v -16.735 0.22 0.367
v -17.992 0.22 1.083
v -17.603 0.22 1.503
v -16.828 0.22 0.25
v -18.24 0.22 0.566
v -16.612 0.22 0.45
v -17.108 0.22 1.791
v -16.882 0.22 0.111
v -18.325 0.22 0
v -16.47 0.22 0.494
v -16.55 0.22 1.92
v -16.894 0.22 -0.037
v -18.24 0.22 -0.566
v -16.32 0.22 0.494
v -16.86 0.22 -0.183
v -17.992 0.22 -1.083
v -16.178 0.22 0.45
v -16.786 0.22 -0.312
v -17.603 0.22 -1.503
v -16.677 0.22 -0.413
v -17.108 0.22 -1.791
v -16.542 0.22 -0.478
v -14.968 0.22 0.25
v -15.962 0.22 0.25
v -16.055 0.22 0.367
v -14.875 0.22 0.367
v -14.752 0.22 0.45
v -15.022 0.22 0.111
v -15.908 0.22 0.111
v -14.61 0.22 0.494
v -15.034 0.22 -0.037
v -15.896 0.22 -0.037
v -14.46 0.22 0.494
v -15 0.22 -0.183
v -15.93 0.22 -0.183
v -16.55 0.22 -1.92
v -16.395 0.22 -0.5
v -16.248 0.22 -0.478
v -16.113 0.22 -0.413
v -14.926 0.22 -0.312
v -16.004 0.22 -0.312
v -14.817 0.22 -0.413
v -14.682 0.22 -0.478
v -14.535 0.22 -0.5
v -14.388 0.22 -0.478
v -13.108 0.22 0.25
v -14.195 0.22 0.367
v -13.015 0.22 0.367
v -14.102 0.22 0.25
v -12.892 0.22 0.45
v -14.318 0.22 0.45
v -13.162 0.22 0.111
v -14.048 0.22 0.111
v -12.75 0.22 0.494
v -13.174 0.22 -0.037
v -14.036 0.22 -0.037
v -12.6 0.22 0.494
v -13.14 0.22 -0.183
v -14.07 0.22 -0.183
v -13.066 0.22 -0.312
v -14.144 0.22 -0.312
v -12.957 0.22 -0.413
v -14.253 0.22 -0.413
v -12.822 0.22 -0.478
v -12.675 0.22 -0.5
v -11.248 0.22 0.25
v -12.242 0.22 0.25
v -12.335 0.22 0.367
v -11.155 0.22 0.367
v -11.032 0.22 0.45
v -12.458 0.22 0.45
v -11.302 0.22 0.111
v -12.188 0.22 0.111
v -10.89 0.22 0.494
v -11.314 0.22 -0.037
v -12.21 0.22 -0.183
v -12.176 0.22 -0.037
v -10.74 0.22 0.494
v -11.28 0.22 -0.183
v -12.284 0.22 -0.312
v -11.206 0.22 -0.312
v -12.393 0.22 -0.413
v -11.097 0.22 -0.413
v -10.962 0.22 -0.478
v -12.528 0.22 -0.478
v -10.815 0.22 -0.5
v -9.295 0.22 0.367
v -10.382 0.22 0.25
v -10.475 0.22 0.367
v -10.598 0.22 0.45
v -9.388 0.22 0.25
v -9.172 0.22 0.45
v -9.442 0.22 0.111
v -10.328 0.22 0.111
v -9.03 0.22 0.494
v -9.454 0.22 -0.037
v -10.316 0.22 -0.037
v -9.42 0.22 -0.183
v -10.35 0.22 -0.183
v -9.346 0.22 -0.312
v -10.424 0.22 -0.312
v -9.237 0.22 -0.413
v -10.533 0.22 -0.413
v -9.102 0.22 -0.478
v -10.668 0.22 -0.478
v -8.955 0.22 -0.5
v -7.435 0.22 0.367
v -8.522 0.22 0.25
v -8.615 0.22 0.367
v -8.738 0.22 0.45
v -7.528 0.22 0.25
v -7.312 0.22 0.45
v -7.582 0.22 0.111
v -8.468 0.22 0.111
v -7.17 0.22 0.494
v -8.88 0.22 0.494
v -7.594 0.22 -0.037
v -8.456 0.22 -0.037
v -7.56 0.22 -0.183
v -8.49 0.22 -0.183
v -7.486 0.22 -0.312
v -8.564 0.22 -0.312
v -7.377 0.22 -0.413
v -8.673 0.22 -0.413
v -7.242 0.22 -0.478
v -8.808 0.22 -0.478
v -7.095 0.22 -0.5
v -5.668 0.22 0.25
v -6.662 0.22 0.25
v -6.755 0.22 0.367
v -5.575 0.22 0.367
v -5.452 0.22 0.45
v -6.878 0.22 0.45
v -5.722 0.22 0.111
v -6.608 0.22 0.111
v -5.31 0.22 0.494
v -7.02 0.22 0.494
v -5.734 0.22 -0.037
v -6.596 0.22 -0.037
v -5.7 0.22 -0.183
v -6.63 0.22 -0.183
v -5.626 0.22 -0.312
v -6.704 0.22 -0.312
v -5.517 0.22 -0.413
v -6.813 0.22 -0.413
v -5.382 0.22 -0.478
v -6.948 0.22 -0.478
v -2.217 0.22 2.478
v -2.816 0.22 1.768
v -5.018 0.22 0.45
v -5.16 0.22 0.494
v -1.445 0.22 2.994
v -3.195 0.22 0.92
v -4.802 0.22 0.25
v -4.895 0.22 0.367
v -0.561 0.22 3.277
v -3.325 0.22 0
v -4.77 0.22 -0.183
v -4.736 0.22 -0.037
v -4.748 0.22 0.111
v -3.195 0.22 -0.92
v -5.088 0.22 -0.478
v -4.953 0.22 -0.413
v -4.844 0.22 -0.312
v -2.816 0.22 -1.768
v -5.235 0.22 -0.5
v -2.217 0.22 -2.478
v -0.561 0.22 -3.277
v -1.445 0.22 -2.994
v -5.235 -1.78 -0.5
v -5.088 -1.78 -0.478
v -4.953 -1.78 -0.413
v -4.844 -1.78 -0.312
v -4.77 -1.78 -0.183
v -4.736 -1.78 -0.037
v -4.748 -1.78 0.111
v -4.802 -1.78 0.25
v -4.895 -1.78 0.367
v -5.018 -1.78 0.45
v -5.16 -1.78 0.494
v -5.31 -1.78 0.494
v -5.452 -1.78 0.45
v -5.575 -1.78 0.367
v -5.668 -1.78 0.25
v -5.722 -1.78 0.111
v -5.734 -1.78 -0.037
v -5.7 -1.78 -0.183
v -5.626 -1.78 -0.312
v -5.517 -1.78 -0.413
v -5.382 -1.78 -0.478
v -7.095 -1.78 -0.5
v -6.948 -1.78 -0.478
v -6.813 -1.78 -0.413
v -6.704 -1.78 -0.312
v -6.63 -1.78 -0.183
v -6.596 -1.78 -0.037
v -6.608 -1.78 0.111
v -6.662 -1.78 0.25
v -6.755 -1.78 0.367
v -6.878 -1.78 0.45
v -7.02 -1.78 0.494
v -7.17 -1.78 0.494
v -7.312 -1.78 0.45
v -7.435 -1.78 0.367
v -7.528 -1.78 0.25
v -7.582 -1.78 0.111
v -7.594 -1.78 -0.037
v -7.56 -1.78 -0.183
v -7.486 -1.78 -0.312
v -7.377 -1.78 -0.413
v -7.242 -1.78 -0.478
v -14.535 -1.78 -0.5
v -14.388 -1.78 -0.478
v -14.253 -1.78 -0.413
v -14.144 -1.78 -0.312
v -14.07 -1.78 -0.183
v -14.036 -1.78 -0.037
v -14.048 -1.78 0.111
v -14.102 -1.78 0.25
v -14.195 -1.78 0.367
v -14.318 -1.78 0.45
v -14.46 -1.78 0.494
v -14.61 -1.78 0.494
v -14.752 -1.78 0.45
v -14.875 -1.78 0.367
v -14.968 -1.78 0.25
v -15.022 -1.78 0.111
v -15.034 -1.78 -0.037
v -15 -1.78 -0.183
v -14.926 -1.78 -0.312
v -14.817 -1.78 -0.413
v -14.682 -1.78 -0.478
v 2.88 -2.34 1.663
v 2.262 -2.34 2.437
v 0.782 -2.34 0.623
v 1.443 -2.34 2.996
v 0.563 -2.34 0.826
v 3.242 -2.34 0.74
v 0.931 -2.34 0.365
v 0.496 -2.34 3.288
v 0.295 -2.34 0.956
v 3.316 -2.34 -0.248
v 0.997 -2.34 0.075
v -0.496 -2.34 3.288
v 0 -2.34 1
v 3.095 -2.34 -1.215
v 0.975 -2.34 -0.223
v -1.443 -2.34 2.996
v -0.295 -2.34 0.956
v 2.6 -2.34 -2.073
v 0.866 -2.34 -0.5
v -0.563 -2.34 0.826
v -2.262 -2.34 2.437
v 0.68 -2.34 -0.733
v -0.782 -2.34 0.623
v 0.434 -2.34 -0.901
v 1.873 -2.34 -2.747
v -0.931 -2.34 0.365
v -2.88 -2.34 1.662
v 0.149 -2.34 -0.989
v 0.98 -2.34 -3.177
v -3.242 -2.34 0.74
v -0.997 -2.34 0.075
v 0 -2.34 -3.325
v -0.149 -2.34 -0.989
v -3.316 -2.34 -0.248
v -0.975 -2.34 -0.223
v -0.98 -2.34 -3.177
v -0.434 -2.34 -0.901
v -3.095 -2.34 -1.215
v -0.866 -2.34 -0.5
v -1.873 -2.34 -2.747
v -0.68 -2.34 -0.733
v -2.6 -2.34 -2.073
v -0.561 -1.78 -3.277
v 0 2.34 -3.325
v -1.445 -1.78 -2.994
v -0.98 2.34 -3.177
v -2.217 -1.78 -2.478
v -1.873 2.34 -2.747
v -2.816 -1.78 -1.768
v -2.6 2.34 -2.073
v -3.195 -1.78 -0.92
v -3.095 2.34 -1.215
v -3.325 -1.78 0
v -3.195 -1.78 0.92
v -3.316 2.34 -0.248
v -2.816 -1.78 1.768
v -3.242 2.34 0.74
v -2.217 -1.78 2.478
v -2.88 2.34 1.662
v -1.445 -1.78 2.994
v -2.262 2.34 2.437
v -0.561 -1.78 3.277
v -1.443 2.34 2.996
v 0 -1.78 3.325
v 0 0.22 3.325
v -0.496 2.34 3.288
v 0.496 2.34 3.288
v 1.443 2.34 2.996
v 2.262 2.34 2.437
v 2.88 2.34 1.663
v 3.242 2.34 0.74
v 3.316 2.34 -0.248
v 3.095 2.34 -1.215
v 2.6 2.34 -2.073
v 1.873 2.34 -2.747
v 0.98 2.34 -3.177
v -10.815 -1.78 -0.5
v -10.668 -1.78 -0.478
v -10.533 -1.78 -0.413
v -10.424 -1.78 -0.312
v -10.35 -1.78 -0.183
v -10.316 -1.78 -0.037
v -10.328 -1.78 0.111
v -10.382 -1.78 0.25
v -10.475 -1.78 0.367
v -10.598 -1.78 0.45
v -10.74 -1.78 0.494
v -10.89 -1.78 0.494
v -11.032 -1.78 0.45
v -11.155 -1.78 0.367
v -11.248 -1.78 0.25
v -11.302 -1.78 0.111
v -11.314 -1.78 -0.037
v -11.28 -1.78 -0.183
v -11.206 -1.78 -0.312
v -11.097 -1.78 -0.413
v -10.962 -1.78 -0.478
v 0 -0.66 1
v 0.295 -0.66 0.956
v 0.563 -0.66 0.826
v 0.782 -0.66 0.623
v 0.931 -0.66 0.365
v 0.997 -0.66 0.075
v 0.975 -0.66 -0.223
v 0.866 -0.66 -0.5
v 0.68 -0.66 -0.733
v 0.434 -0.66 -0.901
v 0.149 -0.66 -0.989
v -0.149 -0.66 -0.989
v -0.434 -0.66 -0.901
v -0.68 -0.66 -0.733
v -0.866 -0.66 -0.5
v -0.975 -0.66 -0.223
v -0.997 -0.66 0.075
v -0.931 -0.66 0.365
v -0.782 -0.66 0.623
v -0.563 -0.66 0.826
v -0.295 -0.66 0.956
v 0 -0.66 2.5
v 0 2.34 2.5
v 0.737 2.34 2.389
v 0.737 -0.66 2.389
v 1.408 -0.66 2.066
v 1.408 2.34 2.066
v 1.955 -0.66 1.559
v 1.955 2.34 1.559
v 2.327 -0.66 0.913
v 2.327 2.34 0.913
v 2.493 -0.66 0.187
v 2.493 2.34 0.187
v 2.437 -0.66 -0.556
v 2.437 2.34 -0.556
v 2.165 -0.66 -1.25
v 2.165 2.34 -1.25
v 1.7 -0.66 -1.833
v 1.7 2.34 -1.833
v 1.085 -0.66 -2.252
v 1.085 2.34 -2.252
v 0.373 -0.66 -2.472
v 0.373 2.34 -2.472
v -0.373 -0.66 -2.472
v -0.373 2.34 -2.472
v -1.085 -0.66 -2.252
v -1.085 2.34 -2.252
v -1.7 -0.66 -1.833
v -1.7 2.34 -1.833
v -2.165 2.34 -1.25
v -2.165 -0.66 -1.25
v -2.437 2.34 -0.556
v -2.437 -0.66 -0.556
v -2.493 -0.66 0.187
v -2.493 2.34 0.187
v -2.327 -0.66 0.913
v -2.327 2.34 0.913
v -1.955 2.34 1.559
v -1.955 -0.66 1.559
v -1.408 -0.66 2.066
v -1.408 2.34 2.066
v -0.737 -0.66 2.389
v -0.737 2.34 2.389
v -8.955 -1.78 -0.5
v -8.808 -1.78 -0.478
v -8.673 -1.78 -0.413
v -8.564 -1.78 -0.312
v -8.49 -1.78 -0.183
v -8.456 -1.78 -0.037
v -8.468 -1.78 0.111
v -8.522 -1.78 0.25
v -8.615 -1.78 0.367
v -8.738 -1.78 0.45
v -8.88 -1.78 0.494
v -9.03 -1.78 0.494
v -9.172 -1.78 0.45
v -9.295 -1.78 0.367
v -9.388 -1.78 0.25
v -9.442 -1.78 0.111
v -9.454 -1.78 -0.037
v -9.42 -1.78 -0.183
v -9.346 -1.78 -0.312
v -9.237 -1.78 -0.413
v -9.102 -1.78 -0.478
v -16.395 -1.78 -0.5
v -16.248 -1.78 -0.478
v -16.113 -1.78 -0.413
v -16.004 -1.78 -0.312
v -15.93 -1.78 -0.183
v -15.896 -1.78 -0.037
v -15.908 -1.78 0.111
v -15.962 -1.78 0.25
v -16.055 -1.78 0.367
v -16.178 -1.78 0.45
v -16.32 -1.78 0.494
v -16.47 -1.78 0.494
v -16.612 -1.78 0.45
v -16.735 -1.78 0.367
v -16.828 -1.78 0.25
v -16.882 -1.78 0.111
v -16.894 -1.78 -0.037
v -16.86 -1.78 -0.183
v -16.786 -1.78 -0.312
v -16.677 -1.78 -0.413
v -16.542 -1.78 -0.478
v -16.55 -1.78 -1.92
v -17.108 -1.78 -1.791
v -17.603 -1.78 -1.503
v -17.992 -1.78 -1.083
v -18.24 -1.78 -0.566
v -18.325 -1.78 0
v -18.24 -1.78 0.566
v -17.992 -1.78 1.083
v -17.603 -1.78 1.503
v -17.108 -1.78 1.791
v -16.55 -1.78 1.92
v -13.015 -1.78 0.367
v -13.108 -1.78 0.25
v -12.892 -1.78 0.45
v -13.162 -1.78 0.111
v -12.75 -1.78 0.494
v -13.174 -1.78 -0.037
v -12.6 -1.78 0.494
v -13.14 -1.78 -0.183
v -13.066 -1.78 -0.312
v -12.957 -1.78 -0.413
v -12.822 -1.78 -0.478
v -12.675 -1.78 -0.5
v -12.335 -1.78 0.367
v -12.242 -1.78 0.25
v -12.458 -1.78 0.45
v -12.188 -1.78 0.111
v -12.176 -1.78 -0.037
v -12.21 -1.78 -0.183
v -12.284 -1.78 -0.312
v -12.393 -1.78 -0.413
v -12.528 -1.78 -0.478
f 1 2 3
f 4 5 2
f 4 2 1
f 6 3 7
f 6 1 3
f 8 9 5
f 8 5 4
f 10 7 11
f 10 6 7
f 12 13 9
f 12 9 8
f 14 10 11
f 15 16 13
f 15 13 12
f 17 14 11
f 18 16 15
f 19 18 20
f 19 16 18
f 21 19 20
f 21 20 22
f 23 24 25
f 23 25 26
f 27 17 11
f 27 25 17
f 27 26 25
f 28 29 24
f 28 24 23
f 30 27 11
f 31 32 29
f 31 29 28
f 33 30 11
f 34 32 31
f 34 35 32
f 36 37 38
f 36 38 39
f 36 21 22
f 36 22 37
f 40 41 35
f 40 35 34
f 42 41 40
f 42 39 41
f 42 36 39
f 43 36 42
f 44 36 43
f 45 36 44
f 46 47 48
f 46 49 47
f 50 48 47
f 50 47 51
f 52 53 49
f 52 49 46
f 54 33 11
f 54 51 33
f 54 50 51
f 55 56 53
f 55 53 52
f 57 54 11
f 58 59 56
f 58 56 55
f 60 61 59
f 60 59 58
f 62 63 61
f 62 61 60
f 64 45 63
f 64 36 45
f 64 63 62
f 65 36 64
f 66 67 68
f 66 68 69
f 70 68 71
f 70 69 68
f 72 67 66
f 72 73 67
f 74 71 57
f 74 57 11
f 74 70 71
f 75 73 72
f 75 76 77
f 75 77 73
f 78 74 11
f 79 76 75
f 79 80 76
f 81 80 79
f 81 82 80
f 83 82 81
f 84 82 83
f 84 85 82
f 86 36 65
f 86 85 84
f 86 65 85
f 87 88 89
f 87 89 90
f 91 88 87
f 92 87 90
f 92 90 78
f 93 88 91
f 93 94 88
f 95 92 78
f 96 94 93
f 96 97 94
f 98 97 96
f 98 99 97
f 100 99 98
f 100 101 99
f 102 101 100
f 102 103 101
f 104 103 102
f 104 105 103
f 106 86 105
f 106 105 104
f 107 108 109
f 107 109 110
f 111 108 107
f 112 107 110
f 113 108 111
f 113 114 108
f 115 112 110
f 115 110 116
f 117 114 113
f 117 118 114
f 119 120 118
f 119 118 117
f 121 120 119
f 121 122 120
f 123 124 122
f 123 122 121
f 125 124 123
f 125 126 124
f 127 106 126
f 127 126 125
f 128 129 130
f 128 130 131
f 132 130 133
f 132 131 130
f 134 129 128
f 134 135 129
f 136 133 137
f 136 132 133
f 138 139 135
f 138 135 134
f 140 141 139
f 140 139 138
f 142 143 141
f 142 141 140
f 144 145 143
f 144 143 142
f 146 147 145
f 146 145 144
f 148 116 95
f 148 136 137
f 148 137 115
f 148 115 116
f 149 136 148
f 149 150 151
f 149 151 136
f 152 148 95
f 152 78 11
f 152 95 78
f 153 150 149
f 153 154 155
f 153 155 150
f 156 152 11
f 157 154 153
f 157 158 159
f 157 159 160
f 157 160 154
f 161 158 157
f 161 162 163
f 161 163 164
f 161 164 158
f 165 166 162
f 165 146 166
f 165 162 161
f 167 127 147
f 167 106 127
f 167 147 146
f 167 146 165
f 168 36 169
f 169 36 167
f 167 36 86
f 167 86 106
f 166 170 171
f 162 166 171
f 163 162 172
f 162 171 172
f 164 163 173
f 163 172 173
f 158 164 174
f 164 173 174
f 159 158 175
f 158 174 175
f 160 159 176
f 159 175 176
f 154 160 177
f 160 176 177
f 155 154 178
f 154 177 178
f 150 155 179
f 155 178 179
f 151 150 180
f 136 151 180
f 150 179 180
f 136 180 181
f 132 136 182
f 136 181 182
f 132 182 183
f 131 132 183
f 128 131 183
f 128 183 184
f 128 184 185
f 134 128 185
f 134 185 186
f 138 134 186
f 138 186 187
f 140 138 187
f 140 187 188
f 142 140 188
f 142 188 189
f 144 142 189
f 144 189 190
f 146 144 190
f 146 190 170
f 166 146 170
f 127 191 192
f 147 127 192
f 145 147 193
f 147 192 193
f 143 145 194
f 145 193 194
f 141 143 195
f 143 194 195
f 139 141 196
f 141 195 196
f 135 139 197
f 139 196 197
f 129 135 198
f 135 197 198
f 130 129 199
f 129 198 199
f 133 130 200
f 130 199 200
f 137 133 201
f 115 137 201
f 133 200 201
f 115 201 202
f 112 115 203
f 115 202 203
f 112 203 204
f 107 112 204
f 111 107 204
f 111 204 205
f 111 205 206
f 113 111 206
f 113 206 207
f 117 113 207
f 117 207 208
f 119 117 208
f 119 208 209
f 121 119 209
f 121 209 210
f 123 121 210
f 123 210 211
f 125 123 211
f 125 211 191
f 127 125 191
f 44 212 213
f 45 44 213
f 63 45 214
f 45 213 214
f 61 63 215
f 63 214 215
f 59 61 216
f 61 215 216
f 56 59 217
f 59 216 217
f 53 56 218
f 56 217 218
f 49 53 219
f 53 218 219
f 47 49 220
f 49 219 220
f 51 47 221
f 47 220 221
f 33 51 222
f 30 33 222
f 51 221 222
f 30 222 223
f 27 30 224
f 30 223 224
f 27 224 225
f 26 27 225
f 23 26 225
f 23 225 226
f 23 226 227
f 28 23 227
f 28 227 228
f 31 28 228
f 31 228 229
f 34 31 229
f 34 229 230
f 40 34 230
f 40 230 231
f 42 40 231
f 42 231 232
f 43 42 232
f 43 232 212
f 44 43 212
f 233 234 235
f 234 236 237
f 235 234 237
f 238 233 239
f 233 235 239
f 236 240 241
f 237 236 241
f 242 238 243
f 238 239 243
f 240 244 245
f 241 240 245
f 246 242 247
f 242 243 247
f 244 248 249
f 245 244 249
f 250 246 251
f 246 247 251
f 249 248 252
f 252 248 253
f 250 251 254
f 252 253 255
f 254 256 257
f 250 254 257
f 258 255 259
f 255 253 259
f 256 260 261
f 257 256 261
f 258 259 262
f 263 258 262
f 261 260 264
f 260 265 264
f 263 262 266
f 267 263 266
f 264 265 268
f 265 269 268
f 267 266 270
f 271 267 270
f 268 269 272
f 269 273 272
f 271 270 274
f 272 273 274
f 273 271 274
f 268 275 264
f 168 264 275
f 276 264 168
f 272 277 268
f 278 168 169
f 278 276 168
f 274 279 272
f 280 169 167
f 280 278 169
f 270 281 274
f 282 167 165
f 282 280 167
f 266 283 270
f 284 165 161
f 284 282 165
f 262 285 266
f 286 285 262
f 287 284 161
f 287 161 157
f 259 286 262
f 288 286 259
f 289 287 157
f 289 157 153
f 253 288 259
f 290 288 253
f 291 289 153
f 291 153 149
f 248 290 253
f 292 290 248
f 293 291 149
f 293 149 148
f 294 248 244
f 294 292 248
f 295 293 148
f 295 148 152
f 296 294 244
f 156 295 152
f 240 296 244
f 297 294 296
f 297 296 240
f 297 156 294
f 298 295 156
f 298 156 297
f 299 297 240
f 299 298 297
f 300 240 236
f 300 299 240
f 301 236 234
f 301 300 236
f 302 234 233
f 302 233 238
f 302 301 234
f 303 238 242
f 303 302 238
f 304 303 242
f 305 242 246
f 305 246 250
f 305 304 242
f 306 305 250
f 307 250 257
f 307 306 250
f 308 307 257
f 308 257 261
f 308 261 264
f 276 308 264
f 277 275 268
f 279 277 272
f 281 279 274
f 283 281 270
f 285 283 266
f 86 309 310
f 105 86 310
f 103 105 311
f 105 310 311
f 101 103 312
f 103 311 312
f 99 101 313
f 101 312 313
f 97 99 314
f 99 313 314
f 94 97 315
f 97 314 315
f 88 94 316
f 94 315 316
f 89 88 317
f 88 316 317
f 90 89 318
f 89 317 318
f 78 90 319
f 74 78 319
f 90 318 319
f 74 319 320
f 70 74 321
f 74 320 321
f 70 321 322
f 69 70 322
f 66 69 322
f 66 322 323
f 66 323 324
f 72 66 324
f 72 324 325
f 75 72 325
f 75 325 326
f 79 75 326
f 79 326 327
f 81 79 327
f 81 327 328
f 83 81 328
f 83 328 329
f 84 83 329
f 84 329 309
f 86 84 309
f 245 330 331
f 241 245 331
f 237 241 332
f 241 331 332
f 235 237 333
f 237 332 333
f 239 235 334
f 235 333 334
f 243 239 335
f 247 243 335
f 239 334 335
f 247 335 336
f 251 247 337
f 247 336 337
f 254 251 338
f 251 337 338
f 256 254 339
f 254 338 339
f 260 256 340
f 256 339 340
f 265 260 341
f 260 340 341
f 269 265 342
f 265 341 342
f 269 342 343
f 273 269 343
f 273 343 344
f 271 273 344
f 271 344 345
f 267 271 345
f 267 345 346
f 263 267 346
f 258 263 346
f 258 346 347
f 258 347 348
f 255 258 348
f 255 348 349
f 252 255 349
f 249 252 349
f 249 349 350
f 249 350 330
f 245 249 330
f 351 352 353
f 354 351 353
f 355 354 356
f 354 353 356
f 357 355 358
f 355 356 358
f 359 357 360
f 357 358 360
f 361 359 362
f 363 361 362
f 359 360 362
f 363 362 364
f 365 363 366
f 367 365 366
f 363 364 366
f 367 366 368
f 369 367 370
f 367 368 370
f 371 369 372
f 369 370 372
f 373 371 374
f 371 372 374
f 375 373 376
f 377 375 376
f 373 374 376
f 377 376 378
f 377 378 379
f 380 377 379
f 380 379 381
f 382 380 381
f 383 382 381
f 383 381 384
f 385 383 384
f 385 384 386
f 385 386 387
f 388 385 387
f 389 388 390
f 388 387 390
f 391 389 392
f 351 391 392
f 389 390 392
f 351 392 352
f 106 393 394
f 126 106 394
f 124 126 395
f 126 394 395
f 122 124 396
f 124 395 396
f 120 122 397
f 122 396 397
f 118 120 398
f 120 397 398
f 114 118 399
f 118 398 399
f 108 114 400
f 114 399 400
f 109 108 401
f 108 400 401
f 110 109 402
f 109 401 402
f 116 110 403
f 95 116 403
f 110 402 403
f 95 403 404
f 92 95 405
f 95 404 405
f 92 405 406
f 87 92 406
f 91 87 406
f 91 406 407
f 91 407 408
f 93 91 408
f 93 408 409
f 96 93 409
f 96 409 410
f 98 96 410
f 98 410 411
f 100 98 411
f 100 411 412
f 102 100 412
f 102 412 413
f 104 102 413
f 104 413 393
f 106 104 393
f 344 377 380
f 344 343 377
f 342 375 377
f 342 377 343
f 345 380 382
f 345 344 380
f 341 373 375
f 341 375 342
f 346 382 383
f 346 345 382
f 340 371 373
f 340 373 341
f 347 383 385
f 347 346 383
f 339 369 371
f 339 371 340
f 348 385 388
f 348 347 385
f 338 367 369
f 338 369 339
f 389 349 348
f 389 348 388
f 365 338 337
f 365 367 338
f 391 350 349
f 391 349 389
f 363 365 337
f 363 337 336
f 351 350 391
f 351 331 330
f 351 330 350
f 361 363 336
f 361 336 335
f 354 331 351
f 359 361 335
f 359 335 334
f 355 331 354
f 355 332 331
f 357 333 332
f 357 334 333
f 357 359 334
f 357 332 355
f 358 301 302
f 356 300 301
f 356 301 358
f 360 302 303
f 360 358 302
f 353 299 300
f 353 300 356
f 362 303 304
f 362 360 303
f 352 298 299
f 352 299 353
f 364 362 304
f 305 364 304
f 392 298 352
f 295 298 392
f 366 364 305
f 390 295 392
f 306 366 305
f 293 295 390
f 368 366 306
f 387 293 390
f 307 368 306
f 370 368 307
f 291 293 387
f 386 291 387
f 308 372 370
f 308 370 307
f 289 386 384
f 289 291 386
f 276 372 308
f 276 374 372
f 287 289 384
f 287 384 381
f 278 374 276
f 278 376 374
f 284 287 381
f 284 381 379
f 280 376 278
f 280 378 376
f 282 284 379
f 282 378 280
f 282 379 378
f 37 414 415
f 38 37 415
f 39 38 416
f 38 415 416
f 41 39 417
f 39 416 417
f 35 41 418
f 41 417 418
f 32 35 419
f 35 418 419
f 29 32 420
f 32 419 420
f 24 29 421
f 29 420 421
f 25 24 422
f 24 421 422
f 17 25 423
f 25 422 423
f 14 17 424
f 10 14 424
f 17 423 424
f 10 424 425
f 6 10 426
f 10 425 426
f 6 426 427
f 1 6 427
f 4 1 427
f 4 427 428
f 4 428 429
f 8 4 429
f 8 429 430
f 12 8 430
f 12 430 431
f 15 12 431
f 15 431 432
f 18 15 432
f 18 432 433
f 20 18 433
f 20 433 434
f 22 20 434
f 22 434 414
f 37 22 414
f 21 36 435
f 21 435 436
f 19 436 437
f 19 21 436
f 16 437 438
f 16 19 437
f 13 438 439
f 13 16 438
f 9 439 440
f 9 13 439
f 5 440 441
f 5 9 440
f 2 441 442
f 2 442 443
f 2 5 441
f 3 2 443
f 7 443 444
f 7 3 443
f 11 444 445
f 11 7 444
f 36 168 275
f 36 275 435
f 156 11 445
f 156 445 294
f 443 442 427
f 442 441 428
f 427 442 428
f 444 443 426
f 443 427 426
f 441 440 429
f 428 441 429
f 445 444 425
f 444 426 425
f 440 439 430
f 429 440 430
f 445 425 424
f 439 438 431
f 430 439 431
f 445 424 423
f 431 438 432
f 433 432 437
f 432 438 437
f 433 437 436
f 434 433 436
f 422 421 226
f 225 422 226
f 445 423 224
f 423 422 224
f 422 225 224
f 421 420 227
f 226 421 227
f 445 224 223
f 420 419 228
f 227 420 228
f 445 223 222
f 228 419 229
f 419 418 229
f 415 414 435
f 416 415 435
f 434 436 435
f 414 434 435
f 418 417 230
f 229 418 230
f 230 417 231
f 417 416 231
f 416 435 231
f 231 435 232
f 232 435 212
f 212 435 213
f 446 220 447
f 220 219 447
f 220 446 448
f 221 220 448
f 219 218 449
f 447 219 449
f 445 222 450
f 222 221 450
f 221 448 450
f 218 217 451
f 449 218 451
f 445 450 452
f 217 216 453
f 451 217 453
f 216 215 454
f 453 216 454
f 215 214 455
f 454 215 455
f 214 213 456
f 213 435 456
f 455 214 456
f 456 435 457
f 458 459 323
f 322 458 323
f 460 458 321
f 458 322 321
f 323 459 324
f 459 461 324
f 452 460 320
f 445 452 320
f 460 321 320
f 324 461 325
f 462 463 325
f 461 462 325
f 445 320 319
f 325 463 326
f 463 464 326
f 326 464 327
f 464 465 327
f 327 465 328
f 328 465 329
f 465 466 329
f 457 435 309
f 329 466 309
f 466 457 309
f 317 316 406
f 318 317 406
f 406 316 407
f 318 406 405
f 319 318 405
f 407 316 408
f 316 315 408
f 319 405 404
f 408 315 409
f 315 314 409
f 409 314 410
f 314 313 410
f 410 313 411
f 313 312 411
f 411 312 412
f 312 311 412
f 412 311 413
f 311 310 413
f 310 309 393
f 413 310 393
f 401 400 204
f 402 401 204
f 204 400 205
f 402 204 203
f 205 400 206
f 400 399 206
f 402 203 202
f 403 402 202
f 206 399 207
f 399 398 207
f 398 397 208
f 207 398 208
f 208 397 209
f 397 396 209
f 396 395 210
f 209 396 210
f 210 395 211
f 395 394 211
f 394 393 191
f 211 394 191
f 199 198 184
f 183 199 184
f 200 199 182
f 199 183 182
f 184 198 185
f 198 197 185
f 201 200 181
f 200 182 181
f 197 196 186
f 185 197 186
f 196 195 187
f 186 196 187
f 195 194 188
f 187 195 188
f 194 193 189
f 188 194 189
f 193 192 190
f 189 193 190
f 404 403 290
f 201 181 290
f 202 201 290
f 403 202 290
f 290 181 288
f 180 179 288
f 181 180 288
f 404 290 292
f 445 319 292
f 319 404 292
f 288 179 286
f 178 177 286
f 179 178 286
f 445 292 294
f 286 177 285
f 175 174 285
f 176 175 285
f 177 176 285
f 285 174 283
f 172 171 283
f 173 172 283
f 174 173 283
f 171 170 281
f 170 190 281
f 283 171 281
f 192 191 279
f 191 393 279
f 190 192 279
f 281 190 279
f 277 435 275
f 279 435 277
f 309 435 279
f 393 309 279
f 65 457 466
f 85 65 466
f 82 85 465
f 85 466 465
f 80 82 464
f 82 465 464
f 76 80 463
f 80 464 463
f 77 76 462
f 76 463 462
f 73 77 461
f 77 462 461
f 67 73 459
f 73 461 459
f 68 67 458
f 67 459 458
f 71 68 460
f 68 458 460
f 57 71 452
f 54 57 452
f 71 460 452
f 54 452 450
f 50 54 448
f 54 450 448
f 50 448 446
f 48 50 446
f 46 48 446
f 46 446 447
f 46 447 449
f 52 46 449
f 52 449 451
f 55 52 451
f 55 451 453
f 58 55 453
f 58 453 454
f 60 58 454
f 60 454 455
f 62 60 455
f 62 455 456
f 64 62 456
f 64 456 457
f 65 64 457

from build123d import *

# Parameters (mm, degrees)
SKETCH_1_R          = 3.325
EXTRUDE_1_DEPTH     = 2.34
SKETCH_2_R          = 2.5
CUT_EXTRUDE_1_DEPTH = 3
SKETCH_3_R          = 1
CUT_EXTRUDE_2_DEPTH = 6.577745961
EXTRUDE_2_DEPTH     = 2
SKETCH_5_R          = 0.5
CUT_EXTRUDE_3_DEPTH = 10


with BuildPart() as part:
    # 草图1 → 凸台-拉伸1 (new, symmetric)
    with BuildSketch(Plane(origin=(0, 0, 0), x_dir=(1, 0, 0), z_dir=(0, 1, 0))):
        with Locations(Location((0, 0, 0), (0, 0, 90))):
            Circle(SKETCH_1_R)
    extrude(amount=EXTRUDE_1_DEPTH, both=True)

    # 草图2 → 切除-拉伸1 (cut)
    with BuildSketch(Plane(origin=(0, 2.34, 0), x_dir=(1, 0, 0), z_dir=(0, 1, 0))):
        with Locations(Location((0, 0, 0), (0, 0, 270))):
            Circle(SKETCH_2_R)
    extrude(amount=-CUT_EXTRUDE_1_DEPTH, mode=Mode.SUBTRACT)

    # 草图3 → 切除-拉伸2 (cut, through all)
    with BuildSketch(Plane(origin=(0, -0.66, 0), x_dir=(1, 0, 0), z_dir=(0, 1, 0))):
        with Locations(Location((0, 0, 0), (0, 0, 270))):
            Circle(SKETCH_3_R)
    extrude(amount=-CUT_EXTRUDE_2_DEPTH, mode=Mode.SUBTRACT)

    # 草图4 → 凸台-拉伸2 (add)
    with BuildSketch(Plane(origin=(0, 0.22, 0), x_dir=(-1, 0, 0), z_dir=(0, -1, 0))):
        with BuildLine():
            Line((0, 3.325), (16.55, 1.92))
            ThreePointArc((16.55, 1.92), (18.325, 0), (16.55, -1.92))
            Line((16.55, -1.92), (0, -3.325))
            ThreePointArc((0, -3.325), (2.566190787, 0), (0, 3.325))
        make_face()
    extrude(amount=EXTRUDE_2_DEPTH)

    # 草图5 → 切除-拉伸3 (cut)
    with BuildSketch(Plane(origin=(0, -1.78, 0), x_dir=(-1, 0, 0), z_dir=(0, -1, 0))):
        with Locations(Location((14.535, 0, 0), (0, 0, 90))):
            Circle(SKETCH_5_R)
        with Locations(Location((16.395, 0, 0), (0, 0, 90))):
            Circle(SKETCH_5_R)
        with Locations(Location((12.675, 0, 0), (0, 0, 90))):
            Circle(SKETCH_5_R)
        with Locations(Location((10.815, 0, 0), (0, 0, 90))):
            Circle(SKETCH_5_R)
        with Locations(Location((8.955, 0, 0), (0, 0, 90))):
            Circle(SKETCH_5_R)
        with Locations(Location((7.095, 0, 0), (0, 0, 90))):
            Circle(SKETCH_5_R)
        with Locations(Location((5.235, 0, 0), (0, 0, 90))):
            Circle(SKETCH_5_R)
    extrude(amount=-CUT_EXTRUDE_3_DEPTH, mode=Mode.SUBTRACT)


solid = part.part
